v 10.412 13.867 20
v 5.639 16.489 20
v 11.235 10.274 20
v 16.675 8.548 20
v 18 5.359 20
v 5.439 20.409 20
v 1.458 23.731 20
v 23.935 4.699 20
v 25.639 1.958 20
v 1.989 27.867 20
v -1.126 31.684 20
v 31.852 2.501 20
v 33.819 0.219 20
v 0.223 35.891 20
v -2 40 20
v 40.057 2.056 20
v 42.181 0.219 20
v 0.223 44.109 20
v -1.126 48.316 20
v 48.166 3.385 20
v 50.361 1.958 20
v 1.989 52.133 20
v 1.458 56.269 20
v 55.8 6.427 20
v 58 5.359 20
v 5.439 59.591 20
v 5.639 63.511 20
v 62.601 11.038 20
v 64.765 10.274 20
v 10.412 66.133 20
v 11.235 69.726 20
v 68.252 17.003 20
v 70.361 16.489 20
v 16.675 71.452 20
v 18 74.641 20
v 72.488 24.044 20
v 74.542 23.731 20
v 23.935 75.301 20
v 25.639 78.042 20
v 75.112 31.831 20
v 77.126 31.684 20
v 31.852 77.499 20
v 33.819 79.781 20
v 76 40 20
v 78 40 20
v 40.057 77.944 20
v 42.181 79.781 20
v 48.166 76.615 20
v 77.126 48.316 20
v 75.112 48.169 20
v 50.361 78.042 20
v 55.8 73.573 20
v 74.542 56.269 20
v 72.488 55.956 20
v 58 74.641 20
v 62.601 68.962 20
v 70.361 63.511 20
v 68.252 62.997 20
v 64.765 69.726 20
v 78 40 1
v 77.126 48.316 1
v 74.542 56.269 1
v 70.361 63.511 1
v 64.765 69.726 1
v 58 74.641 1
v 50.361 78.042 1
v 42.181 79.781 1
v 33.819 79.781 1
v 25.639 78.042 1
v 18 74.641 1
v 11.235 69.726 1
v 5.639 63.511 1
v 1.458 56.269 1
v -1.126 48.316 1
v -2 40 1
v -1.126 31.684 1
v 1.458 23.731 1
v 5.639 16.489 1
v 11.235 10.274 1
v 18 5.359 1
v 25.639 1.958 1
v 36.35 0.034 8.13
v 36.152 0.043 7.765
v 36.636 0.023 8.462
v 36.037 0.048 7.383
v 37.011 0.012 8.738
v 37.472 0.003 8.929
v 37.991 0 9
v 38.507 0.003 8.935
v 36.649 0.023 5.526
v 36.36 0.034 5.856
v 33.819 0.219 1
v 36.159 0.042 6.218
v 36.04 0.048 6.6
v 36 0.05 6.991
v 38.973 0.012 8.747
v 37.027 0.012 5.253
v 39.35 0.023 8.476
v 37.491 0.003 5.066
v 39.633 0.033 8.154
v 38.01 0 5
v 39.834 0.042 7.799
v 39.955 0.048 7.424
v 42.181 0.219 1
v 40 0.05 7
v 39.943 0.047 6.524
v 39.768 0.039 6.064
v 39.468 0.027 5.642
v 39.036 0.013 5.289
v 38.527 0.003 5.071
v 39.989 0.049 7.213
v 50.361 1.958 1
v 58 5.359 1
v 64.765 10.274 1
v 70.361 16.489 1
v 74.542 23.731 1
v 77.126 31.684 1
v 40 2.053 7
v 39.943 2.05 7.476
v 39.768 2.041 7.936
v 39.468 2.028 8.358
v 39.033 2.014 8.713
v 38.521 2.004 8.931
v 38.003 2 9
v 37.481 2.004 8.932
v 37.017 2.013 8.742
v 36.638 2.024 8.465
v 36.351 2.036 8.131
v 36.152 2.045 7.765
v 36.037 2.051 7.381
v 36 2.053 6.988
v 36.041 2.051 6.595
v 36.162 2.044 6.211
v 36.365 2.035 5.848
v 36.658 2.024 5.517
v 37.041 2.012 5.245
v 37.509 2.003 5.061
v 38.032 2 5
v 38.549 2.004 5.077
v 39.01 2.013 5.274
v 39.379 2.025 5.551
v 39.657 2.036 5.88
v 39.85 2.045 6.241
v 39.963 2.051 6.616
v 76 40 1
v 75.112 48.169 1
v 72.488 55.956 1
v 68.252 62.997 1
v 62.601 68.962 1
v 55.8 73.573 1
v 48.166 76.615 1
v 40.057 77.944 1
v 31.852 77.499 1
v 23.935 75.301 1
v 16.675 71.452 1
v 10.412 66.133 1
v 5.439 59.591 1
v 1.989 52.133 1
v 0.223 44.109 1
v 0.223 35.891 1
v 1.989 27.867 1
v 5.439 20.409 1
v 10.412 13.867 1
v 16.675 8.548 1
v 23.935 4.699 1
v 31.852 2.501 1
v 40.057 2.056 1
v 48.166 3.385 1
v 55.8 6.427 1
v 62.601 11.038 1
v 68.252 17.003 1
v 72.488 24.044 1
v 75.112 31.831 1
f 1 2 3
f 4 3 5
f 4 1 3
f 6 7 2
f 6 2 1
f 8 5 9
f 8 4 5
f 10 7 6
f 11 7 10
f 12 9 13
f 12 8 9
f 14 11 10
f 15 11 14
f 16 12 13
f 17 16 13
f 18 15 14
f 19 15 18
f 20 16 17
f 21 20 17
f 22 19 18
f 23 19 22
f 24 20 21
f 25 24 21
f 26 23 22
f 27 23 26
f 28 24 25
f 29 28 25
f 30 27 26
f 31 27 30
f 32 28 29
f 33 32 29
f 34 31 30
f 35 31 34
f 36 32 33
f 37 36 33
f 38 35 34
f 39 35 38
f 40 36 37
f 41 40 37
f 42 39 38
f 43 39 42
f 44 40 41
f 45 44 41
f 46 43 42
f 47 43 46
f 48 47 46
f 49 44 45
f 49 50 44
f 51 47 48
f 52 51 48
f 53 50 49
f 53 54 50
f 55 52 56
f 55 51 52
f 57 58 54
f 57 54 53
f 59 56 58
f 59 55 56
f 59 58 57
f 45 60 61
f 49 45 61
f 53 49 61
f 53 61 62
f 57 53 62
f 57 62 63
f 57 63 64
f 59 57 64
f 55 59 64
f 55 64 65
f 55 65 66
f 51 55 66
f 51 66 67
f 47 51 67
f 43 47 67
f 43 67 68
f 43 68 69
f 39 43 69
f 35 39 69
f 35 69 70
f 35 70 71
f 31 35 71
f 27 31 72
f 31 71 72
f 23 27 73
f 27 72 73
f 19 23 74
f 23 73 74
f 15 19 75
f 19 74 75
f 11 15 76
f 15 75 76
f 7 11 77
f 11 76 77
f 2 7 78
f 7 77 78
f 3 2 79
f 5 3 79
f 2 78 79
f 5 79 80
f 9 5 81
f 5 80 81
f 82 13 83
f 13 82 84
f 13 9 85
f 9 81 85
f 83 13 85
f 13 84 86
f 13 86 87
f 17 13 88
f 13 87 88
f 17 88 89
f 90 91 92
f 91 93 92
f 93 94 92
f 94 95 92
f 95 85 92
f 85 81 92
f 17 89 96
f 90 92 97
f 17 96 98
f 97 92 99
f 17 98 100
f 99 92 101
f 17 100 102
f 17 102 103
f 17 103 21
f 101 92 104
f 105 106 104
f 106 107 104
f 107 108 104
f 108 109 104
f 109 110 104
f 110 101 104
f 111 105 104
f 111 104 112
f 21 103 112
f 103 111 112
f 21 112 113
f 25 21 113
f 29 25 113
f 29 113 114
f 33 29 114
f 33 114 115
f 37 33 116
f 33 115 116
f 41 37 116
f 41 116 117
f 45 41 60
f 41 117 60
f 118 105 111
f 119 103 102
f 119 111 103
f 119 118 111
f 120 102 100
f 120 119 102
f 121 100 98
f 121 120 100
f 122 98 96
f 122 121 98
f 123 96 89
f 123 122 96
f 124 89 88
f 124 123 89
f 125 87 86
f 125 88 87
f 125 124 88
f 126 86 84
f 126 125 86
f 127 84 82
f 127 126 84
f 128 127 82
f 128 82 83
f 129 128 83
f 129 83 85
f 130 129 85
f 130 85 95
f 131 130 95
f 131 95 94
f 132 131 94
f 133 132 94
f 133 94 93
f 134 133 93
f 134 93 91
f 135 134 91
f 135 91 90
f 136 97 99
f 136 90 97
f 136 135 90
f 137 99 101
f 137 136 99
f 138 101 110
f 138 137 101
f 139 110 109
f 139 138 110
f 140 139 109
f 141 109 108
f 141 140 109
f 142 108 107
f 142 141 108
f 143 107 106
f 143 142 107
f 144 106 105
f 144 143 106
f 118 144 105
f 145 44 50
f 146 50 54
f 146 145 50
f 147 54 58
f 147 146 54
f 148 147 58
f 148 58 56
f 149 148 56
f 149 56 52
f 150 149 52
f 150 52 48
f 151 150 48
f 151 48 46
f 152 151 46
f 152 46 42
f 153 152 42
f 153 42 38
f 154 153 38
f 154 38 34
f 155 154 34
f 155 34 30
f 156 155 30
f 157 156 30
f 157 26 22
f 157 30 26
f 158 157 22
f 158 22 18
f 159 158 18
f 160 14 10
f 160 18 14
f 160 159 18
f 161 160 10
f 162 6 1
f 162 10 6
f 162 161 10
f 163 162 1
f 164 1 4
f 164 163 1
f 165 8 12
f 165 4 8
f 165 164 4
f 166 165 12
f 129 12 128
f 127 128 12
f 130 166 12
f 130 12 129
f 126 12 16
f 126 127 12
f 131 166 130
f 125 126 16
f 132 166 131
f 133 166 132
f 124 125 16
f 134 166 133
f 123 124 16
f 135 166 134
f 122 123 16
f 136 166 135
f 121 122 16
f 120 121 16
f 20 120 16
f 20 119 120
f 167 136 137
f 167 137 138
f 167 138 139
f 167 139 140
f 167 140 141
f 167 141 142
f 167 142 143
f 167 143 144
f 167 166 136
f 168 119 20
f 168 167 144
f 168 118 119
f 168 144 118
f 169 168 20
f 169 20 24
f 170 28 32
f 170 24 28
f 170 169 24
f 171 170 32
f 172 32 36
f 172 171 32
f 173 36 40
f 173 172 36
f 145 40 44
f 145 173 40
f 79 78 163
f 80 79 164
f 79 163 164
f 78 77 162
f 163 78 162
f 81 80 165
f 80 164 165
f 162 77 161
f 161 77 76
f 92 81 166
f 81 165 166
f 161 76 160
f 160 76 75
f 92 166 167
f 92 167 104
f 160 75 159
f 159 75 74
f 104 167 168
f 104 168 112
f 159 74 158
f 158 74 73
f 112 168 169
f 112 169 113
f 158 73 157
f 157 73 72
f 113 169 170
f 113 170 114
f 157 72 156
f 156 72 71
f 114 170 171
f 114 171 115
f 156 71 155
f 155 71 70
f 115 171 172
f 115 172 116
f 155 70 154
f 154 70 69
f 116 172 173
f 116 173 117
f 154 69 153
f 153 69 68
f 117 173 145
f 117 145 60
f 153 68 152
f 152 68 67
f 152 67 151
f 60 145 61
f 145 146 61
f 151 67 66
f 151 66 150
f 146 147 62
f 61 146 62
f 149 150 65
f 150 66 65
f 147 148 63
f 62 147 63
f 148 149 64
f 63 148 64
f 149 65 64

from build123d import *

# Parameters (mm, degrees)
CYLINDER010_R     = 2
CYLINDER010_DEPTH = 3
CYLINDER_R        = 38
CYLINDER_DEPTH    = 20
CYLINDER001_R     = 40
CYLINDER001_DEPTH = 19


with BuildPart() as wirehole:
    # Cylinder010 → Cylinder010 (new body)
    with BuildSketch(Plane(origin=(38, 1, 5), x_dir=(1, 0, 0), z_dir=(0, -1, 0))):
        Circle(CYLINDER010_R)
    extrude(amount=CYLINDER010_DEPTH)


with BuildPart() as depthpunch:
    # Cylinder → Cylinder (new body)
    with BuildSketch(Plane(origin=(38, 38, -1), x_dir=(1, 0, 0), z_dir=(0, 0, 1))):
        Circle(CYLINDER_R)
    extrude(amount=CYLINDER_DEPTH)

    # Fusion004: union WireHole
    add(wirehole.part)


with BuildPart() as depth:
    # Cylinder001 → Cylinder001 (new body)
    with BuildSketch(Plane(origin=(38, 38, -1), x_dir=(1, 0, 0), z_dir=(0, 0, 1))):
        Circle(CYLINDER001_R)
    extrude(amount=CYLINDER001_DEPTH)

    # Cut007: cut DEPTHPUNCH
    add(depthpunch.part, mode=Mode.SUBTRACT)


with BuildPart() as depth_1:
    # Cut007 placement: moved
    add(depth.part.moved(Location((0, 2, 2))))


solid = depth_1.part
